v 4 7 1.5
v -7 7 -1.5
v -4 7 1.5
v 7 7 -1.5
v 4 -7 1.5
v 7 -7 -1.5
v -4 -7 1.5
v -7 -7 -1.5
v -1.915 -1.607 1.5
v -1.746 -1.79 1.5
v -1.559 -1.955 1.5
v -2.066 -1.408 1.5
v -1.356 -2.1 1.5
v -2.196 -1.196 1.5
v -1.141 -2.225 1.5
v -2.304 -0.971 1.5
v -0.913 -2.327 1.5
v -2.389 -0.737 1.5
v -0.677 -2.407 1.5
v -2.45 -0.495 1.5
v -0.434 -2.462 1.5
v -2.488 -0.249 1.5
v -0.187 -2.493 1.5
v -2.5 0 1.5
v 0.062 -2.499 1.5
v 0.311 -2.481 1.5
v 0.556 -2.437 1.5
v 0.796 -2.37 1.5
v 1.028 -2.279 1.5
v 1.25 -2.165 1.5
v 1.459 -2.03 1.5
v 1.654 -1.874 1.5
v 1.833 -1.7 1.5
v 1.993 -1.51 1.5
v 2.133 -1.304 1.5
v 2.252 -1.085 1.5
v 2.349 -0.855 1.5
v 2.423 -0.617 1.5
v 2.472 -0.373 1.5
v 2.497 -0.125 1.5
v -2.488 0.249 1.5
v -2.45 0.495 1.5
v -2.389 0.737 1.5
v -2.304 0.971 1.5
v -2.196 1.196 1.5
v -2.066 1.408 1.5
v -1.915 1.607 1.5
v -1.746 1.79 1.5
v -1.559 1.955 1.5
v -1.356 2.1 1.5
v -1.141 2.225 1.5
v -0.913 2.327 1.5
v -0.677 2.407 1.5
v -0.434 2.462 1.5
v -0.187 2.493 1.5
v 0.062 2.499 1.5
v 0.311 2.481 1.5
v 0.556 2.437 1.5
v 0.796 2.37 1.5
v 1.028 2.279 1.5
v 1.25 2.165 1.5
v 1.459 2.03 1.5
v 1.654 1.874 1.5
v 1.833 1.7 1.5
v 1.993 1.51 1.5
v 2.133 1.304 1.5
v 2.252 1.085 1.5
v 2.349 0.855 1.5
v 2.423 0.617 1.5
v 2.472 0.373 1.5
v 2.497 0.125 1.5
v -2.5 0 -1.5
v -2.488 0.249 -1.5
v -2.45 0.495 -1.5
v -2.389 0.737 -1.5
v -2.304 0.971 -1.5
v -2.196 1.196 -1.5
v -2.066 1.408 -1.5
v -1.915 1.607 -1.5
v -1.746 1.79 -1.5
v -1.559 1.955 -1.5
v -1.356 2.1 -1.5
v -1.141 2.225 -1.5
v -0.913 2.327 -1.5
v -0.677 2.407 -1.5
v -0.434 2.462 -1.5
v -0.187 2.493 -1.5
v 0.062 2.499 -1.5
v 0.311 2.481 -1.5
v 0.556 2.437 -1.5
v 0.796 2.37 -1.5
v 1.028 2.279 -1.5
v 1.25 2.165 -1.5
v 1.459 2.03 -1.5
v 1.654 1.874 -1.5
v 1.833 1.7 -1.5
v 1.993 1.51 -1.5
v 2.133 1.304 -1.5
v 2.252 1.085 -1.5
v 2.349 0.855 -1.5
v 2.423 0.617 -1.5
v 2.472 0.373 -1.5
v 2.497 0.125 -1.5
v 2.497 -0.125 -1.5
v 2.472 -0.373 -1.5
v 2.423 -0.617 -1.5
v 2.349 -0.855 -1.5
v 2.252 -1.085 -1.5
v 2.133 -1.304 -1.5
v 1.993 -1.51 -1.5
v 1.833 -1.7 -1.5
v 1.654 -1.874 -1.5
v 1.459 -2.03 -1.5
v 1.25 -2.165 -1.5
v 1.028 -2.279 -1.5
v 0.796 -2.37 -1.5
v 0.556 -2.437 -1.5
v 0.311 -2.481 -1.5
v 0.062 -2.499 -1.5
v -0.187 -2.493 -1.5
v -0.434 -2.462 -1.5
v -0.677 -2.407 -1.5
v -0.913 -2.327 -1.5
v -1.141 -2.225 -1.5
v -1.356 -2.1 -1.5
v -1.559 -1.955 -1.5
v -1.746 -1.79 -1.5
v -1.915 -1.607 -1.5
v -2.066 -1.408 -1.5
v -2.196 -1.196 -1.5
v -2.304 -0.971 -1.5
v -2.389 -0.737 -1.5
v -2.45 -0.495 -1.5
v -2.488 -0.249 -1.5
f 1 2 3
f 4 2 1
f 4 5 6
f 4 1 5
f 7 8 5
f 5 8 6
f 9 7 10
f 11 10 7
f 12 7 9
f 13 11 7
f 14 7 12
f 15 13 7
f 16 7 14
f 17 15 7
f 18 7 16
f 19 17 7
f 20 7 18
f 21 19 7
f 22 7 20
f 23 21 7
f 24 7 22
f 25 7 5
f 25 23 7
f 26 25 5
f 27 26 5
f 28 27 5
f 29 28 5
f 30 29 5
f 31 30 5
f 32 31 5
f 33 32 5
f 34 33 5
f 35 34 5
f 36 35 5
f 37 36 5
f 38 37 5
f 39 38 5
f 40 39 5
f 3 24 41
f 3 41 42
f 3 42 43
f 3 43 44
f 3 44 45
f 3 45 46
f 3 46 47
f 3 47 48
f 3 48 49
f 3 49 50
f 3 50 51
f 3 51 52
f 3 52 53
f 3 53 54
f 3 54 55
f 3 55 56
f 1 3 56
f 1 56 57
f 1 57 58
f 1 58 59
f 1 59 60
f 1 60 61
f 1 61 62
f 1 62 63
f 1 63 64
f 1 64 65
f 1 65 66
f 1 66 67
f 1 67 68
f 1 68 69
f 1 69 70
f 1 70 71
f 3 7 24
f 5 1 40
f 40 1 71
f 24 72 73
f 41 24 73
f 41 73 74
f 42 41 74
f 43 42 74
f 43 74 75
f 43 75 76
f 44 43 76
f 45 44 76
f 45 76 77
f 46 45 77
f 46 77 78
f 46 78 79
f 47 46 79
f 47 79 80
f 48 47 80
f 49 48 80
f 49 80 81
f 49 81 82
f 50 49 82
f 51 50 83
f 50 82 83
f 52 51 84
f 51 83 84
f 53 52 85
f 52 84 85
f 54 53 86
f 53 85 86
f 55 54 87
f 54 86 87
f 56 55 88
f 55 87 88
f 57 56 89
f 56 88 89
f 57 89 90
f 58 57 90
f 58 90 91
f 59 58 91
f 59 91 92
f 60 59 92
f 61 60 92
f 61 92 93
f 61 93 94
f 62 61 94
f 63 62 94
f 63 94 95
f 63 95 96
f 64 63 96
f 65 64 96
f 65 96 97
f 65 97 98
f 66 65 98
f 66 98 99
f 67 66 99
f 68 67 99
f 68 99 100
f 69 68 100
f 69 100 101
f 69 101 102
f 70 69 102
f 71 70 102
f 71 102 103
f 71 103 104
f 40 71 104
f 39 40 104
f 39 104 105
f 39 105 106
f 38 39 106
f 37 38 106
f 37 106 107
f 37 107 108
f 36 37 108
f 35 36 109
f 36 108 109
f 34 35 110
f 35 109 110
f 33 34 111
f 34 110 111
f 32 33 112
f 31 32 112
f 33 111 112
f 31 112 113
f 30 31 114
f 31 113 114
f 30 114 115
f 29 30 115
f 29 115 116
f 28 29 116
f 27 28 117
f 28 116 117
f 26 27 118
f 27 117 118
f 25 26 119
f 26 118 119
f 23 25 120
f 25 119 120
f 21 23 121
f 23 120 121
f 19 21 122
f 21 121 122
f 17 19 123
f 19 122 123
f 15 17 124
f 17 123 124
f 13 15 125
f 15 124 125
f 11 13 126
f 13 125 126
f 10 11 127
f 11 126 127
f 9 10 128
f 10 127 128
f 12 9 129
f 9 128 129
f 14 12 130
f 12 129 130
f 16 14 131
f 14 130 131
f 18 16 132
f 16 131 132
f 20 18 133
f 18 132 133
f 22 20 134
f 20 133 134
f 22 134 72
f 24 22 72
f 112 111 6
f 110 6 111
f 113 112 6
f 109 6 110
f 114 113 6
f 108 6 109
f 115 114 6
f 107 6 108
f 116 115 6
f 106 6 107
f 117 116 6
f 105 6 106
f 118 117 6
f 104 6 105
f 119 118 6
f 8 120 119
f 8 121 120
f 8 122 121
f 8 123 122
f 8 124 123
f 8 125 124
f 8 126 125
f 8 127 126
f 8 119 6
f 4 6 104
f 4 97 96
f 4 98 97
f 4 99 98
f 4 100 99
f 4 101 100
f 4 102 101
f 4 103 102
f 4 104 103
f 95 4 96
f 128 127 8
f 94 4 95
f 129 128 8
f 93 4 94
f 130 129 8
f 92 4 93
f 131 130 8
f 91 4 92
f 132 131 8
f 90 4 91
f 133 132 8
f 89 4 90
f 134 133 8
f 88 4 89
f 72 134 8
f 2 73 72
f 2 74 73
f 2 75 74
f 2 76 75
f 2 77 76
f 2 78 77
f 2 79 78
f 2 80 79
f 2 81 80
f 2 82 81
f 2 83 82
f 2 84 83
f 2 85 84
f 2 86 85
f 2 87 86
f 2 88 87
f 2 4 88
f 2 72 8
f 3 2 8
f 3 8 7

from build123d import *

# Parameters (mm, degrees)
BOSS_EXTRUDE1_DEPTH = 7
SKETCH2_R           = 2.5
CUT_EXTRUDE1_DEPTH  = 14


with BuildPart() as part:
    # Sketch1 → Boss-Extrude1 (new, symmetric)
    with BuildSketch(Plane(origin=(0, 0, 0), x_dir=(1, 0, 0), z_dir=(0, 1, 0))):
        Polygon((7, 1.5), (-7, 1.5), (-4, -1.5), (4, -1.5), align=None)
    extrude(amount=BOSS_EXTRUDE1_DEPTH, both=True)

    # Sketch2 → Cut-Extrude1 (cut)
    with BuildSketch(Plane(origin=(0, 0, -1.5), x_dir=(-1, 0, 0), z_dir=(0, 0, -1))):
        Circle(SKETCH2_R)
    extrude(amount=-CUT_EXTRUDE1_DEPTH, mode=Mode.SUBTRACT)


solid = part.part
